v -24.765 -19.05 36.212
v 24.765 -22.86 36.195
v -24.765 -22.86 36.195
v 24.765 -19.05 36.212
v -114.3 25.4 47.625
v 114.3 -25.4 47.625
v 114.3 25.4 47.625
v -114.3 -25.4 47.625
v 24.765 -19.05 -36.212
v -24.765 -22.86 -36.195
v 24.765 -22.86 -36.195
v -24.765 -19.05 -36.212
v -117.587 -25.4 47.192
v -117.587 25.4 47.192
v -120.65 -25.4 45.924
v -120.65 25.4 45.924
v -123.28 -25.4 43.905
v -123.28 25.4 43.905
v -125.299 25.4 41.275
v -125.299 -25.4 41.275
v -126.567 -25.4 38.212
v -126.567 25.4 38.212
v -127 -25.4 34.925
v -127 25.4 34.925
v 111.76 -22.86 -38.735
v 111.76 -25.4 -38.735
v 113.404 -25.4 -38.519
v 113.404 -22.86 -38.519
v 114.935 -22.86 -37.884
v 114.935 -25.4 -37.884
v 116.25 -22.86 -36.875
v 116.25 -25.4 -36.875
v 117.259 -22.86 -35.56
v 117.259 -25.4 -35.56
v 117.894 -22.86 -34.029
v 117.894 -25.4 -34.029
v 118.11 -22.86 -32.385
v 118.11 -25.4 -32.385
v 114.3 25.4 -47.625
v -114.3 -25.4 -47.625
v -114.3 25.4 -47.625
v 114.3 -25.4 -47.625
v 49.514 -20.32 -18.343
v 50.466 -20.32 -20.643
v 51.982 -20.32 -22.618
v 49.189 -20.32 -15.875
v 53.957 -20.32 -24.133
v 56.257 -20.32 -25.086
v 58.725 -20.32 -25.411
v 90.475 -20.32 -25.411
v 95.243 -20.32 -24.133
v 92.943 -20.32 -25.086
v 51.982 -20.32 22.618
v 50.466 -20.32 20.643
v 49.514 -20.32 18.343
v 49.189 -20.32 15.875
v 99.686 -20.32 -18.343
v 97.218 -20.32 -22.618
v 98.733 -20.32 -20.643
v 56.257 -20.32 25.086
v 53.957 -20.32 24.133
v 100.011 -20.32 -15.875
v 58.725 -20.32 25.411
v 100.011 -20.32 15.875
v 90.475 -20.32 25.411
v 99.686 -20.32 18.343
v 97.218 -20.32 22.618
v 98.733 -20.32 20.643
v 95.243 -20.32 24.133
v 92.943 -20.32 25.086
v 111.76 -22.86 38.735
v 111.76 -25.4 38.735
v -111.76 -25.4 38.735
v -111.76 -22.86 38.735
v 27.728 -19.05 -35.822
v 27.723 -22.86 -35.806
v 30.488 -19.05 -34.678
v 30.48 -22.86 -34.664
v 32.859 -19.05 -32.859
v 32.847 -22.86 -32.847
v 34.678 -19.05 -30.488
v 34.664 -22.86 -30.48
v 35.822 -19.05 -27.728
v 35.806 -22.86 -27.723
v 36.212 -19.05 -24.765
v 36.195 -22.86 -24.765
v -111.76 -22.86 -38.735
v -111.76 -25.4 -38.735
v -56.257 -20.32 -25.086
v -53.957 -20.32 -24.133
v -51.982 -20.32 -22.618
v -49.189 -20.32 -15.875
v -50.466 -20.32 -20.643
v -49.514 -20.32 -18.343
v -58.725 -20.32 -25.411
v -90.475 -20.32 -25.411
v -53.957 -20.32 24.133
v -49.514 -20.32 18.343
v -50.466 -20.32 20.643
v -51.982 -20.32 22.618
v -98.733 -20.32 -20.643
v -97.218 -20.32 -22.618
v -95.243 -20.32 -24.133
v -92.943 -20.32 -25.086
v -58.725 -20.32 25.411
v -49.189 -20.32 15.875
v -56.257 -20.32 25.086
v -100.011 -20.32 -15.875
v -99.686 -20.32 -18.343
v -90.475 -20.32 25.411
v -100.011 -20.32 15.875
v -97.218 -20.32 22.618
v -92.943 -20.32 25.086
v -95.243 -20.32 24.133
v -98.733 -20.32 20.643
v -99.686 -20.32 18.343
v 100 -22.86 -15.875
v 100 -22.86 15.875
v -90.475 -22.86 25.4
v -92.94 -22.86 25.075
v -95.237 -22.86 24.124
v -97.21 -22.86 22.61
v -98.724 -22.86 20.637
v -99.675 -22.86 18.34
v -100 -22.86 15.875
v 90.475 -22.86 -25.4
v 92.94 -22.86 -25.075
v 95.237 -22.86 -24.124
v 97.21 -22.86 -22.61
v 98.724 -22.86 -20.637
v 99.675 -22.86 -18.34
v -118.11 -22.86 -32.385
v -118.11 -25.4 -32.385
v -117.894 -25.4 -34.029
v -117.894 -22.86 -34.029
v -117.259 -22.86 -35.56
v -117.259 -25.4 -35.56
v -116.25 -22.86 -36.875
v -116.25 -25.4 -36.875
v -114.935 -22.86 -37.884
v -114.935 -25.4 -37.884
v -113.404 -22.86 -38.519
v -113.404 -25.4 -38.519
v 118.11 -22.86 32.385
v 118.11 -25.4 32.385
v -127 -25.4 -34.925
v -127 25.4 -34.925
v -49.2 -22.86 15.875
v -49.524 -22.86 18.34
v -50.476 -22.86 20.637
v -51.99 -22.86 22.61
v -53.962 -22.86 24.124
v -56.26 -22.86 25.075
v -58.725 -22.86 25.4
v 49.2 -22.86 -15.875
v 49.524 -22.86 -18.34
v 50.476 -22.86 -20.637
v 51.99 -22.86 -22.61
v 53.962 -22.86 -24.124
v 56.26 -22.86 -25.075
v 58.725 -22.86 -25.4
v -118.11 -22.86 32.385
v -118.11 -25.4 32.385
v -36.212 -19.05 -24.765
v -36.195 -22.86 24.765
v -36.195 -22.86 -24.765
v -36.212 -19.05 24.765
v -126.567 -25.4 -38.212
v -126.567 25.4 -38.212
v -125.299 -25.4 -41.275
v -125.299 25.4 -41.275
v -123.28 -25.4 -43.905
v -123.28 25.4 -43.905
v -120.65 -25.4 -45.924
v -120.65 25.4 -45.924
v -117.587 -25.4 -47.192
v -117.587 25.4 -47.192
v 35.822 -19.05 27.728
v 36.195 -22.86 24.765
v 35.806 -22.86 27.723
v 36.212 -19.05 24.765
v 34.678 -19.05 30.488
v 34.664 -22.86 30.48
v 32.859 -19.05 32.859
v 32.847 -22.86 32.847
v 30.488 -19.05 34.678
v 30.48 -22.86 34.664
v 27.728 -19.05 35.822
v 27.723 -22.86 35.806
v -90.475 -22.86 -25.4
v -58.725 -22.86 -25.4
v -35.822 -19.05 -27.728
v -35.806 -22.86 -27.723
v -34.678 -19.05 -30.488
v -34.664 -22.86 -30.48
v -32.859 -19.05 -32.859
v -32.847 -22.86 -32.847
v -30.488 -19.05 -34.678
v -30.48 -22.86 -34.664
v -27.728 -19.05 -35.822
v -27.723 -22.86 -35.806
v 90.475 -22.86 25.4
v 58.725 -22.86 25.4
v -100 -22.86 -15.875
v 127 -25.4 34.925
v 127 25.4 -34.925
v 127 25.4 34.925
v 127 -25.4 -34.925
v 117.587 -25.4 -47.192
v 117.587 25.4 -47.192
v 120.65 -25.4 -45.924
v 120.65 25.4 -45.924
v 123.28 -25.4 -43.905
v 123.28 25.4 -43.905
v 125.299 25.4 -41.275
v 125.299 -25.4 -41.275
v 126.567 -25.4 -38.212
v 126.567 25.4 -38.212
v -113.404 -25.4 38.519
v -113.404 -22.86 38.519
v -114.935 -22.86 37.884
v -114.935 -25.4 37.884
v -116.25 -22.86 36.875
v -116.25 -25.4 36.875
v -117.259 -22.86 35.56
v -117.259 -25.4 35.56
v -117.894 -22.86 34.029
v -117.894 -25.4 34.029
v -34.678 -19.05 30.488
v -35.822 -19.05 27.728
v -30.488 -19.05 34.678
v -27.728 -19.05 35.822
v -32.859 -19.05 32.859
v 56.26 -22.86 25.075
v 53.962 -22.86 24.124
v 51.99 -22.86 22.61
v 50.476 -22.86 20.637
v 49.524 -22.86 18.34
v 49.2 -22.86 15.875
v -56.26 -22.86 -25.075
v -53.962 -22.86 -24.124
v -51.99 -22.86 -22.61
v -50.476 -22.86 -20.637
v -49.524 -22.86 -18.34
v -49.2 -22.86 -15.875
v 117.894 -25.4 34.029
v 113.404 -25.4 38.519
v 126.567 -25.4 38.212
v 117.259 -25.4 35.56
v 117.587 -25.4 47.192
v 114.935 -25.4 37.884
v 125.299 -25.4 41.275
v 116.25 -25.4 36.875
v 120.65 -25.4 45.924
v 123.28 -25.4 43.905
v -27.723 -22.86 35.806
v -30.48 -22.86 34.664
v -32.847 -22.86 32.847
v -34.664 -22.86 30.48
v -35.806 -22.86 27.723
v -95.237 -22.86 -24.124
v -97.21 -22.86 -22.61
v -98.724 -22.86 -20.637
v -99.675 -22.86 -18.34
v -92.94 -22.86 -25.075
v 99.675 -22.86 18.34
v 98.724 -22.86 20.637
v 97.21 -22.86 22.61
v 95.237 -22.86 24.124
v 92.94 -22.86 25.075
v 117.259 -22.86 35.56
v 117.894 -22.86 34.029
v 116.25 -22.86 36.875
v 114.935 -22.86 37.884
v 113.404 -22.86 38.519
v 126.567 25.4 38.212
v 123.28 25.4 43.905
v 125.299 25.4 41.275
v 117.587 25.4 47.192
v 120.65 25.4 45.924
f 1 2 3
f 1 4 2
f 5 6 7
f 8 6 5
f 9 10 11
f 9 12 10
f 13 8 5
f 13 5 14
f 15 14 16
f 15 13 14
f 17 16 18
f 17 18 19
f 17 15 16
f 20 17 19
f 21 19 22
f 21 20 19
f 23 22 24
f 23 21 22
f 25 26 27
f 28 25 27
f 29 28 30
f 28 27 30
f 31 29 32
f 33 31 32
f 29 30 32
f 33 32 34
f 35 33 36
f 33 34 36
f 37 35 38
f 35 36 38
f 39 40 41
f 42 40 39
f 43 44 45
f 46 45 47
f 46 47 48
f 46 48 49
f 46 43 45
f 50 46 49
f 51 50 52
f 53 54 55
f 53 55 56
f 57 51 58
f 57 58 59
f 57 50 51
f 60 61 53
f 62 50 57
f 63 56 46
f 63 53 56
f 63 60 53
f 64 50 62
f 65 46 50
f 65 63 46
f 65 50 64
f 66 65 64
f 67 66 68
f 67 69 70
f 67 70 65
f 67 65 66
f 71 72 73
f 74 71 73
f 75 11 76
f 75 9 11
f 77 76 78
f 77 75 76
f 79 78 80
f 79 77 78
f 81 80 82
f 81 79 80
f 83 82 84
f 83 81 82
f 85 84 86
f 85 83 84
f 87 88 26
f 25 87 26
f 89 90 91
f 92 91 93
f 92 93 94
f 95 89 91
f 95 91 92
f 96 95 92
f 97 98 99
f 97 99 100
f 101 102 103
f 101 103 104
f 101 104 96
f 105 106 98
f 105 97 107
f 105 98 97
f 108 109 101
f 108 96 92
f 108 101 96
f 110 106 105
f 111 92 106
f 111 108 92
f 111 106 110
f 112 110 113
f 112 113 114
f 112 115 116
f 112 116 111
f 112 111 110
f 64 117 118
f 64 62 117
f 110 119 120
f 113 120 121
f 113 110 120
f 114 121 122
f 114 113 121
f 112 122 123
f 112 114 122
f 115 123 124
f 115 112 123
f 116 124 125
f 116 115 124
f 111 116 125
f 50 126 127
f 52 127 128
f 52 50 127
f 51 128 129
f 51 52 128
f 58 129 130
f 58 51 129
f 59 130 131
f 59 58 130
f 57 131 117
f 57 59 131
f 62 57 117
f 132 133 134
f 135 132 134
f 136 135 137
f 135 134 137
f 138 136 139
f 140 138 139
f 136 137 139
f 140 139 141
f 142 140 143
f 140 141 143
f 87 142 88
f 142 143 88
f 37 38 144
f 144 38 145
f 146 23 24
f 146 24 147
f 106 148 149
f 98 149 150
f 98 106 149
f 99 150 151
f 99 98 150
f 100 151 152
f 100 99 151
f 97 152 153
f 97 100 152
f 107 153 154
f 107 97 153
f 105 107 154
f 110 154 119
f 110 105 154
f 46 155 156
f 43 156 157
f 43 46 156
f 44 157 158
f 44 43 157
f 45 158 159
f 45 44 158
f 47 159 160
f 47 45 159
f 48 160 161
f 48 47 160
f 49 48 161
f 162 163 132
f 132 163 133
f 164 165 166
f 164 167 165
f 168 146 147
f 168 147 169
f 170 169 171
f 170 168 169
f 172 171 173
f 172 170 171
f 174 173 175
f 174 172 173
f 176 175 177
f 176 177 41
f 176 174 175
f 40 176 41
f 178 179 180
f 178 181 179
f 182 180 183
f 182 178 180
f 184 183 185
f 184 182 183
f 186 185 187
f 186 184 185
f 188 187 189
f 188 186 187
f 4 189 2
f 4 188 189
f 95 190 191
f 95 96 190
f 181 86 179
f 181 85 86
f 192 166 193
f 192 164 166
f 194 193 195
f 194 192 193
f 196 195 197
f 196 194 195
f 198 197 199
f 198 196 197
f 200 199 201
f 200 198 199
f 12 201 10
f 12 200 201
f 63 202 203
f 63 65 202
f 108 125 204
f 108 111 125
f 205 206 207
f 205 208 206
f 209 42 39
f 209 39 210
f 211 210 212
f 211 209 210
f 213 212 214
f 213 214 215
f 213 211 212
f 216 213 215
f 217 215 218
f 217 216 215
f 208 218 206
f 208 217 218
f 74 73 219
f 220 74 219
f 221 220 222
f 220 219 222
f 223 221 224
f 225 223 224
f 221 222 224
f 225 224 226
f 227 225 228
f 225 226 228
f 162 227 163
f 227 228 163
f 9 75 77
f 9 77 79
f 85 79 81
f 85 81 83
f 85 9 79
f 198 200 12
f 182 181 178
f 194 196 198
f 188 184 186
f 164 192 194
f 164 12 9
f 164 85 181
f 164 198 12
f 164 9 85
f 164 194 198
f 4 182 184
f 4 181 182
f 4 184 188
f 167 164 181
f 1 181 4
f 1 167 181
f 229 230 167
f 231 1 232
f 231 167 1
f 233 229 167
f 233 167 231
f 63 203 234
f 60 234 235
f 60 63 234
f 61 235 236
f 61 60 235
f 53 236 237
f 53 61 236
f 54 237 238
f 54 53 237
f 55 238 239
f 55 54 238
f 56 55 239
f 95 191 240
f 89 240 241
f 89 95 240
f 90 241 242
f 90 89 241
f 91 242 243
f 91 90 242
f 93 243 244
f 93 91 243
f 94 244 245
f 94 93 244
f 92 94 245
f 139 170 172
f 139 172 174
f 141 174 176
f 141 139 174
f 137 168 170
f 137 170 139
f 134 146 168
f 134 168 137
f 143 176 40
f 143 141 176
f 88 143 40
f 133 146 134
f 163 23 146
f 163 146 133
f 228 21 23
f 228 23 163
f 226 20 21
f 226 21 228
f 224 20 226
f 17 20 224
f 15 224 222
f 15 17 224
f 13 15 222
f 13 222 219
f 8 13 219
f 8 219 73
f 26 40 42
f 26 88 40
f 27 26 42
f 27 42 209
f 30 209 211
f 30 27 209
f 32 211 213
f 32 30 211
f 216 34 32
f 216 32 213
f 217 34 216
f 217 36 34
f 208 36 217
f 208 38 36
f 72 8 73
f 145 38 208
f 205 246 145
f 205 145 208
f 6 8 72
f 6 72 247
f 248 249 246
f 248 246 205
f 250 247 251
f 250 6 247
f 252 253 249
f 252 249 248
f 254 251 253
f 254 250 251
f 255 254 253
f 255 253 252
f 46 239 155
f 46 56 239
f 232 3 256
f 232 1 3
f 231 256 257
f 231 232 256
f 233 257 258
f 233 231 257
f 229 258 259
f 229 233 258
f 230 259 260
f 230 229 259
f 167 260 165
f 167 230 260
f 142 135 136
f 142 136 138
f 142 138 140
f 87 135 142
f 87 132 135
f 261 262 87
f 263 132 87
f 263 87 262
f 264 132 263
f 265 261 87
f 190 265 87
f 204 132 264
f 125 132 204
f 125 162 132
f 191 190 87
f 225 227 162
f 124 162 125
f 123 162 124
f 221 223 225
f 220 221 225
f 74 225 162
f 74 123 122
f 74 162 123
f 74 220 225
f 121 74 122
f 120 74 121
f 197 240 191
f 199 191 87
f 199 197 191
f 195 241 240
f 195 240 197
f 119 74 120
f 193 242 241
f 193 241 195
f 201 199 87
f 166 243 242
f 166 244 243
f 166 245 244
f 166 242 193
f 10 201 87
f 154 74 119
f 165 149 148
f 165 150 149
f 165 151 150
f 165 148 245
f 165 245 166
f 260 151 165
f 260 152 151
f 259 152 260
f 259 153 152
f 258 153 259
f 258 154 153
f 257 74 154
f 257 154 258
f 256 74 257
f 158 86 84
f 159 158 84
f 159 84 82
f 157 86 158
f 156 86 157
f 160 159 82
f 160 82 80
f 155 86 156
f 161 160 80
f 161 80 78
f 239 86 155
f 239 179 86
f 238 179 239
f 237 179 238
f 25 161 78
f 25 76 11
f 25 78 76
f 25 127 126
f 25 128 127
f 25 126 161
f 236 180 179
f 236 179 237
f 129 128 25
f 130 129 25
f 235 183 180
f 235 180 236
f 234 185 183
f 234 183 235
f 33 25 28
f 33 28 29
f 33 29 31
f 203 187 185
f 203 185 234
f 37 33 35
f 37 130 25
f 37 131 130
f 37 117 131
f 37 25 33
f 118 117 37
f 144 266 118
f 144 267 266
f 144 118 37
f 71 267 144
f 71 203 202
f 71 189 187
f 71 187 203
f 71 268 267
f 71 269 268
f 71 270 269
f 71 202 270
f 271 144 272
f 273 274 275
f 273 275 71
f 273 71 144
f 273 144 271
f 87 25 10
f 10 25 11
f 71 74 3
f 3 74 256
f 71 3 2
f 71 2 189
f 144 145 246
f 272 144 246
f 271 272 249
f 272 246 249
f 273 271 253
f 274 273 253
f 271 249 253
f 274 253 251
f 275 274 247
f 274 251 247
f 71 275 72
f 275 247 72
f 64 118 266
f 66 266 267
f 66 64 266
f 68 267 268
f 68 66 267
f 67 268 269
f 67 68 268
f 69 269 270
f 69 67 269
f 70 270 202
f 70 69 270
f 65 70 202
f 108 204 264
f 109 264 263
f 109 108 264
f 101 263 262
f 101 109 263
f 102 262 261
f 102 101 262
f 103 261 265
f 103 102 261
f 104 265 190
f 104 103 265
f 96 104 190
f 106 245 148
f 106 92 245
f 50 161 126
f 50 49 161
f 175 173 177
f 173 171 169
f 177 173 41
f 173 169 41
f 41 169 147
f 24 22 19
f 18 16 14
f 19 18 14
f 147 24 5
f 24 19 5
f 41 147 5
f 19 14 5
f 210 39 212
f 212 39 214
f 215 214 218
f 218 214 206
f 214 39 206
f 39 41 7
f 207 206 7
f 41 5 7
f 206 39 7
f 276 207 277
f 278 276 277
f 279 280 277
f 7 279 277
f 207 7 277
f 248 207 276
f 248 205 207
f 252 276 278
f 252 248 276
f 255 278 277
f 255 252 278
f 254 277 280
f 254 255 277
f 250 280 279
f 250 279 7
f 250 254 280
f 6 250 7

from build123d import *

# Parameters (mm, degrees)
F0_R     = 32.385
F0_R_2   = 20.32
F1_DEPTH = 25.4
F3_DEPTH = 2.54
F5_DEPTH = 3.81
F5_TAPER = -0.25
F7_DEPTH = 2.54
F7_TAPER = -0.25


with BuildPart() as f1:
    # F0 (on Front) → F1 (new body, symmetric)
    with BuildSketch(Plane.XZ):
        with BuildLine():
            Line((114.3, 47.625), (-114.3, 47.625))
            ThreePointArc((-114.3, 47.625), (-123.2802561211, 43.9052561211), (-127, 34.925))
            Line((-127, 34.925), (-127, -34.925))
            ThreePointArc((-127, -34.925), (-123.2802561211, -43.9052561211), (-114.3, -47.625))
            Line((-114.3, -47.625), (114.3, -47.625))
            ThreePointArc((114.3, -47.625), (123.2802561211, -43.9052561211), (127, -34.925))
            Line((127, -34.925), (127, 34.925))
            ThreePointArc((127, 34.925), (123.2802561211, 43.9052561211), (114.3, 47.625))
        make_face()
        Circle(F0_R, mode=Mode.SUBTRACT)
        with Locations((-74.5998, 0)):
            Circle(F0_R_2, mode=Mode.SUBTRACT)
        with Locations((74.5998, 0)):
            Circle(F0_R_2, mode=Mode.SUBTRACT)
        with Locations((74.5998, 0)):
            Circle(F0_R_2)
        Circle(F0_R)
        with Locations((-74.5998, 0)):
            Circle(F0_R_2)
    extrude(amount=F1_DEPTH, both=True)

    # F2 (on face) → F3 (cut)
    with BuildSketch(Plane.XZ.offset(25.4)):
        with BuildLine():
            Line((-111.76, -38.735), (111.76, -38.735))
            ThreePointArc((111.76, -38.735), (116.2501280605, -36.8751280605), (118.11, -32.385))
            Line((118.11, -32.385), (118.11, 32.385))
            ThreePointArc((118.11, 32.385), (116.2501280605, 36.8751280605), (111.76, 38.735))
            Line((111.76, 38.735), (-111.76, 38.735))
            ThreePointArc((-111.76, 38.735), (-116.2501280605, 36.8751280605), (-118.11, 32.385))
            Line((-118.11, 32.385), (-118.11, -32.385))
            ThreePointArc((-118.11, -32.385), (-116.2501280605, -36.8751280605), (-111.76, -38.735))
        make_face()
    extrude(amount=-F3_DEPTH, mode=Mode.SUBTRACT)

    # F4 (on face) → F5 (cut)
    with BuildSketch(Plane.XZ.offset(22.86)):
        with BuildLine():
            Line((24.765, 36.195), (-24.765, 36.195))
            ThreePointArc((-24.765, 36.195), (-32.847230509, 32.847230509), (-36.195, 24.765))
            Line((-36.195, 24.765), (-36.195, -24.765))
            ThreePointArc((-36.195, -24.765), (-32.847230509, -32.847230509), (-24.765, -36.195))
            Line((-24.765, -36.195), (24.765, -36.195))
            ThreePointArc((24.765, -36.195), (32.847230509, -32.847230509), (36.195, -24.765))
            Line((36.195, -24.765), (36.195, 24.765))
            ThreePointArc((36.195, 24.765), (32.847230509, 32.847230509), (24.765, 36.195))
        make_face()
    extrude(amount=-F5_DEPTH, taper=F5_TAPER, mode=Mode.SUBTRACT)

    # F6 (on face) → F7 (cut)
    with BuildSketch(Plane.XZ.offset(22.86)):
        with BuildLine():
            Line((-58.7248, 25.4), (-90.4748, 25.4))
            ThreePointArc((-90.4748, 25.4), (-97.2099920908, 22.6101920908), (-99.9998, 15.875))
            Line((-99.9998, 15.875), (-99.9998, -15.875))
            ThreePointArc((-99.9998, -15.875), (-97.2099920908, -22.6101920908), (-90.4748, -25.4))
            Line((-90.4748, -25.4), (-58.7248, -25.4))
            ThreePointArc((-58.7248, -25.4), (-51.9896079092, -22.6101920908), (-49.1998, -15.875))
            Line((-49.1998, -15.875), (-49.1998, 15.875))
            ThreePointArc((-49.1998, 15.875), (-51.9896079092, 22.6101920908), (-58.7248, 25.4))
        make_face()
        with BuildLine():
            ThreePointArc((99.9998, 15.875), (97.2099920908, 22.6101920908), (90.4748, 25.4))
            Line((90.4748, 25.4), (58.7248, 25.4))
            ThreePointArc((58.7248, 25.4), (51.9896079092, 22.6101920908), (49.1998, 15.875))
            Line((49.1998, 15.875), (49.1998, -15.875))
            ThreePointArc((49.1998, -15.875), (51.9896079092, -22.6101920908), (58.7248, -25.4))
            Line((58.7248, -25.4), (90.4748, -25.4))
            ThreePointArc((90.4748, -25.4), (97.2099920908, -22.6101920908), (99.9998, -15.875))
            Line((99.9998, -15.875), (99.9998, 15.875))
        make_face()
    extrude(amount=-F7_DEPTH, taper=F7_TAPER, mode=Mode.SUBTRACT)


solid = f1.part
